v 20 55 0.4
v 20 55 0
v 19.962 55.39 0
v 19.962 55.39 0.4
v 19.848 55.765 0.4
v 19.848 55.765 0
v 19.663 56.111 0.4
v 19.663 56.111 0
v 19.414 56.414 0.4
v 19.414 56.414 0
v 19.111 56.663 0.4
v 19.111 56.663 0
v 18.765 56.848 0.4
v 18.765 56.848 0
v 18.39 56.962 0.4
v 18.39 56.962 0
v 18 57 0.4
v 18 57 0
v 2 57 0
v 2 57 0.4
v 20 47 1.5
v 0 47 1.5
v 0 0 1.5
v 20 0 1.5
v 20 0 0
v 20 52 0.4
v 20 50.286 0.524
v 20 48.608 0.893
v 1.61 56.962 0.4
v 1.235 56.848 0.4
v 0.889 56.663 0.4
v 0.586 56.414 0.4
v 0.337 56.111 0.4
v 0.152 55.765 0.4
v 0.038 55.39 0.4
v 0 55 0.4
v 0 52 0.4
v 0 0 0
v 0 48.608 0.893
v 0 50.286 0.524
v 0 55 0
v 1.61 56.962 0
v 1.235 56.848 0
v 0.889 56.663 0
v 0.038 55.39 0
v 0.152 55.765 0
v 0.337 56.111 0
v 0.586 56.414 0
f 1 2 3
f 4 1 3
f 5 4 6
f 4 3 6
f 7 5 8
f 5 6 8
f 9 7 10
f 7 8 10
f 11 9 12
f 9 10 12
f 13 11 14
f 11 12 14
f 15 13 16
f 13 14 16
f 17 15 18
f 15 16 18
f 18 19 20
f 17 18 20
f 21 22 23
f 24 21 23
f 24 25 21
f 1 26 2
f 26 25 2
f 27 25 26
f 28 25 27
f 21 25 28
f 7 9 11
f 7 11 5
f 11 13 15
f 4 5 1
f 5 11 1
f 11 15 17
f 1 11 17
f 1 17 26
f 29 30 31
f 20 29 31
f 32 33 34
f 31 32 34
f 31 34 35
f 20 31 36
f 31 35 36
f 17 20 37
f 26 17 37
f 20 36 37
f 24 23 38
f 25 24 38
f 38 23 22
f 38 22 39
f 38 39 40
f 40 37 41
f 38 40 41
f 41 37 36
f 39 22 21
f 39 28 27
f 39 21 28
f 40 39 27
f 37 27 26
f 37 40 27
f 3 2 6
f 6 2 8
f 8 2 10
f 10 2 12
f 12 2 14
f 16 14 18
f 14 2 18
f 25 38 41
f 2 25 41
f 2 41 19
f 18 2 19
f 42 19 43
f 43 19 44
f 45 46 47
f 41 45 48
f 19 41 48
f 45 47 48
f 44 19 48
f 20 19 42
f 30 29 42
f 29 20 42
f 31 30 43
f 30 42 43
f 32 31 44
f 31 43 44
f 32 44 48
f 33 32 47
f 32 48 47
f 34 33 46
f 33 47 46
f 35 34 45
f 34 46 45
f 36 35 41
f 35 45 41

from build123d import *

# Parameters (mm, degrees)
EXTRUDE012_DEPTH = 10
EXTRUDE011_DEPTH = 40


with BuildPart() as extrude012:
    # Sketch006 → Extrude012 (new body)
    with BuildSketch(Plane.XY):
        with BuildLine():
            ThreePointArc((2, 57), (0.585786, 56.414214), (0, 55))
            Line((0, 55), (0, 0))
            Line((0, 0), (20, 0))
            Line((20, 0), (20, 55))
            ThreePointArc((20, 55), (19.414214, 56.414214), (18, 57))
            Line((2, 57), (18, 57))
        make_face()
    extrude(amount=EXTRUDE012_DEPTH)


with BuildPart() as body002:
    # Sketch007 → Extrude011 (new body)
    with BuildSketch(Plane.YZ):
        with BuildLine():
            Line((0, 0), (57, 0))
            Line((57, 0), (57, 0.4))
            Line((57, 0.4), (52, 0.4))
            ThreePointArc((47, 1.5), (49.440215, 0.678249), (52, 0.4))
            Line((47, 1.5), (0, 1.5))
            Line((0, 1.5), (0, 0))
        make_face()
    extrude(amount=EXTRUDE011_DEPTH)

    # Common: intersect Extrude012
    add(extrude012.part, mode=Mode.INTERSECT)


solid = body002.part
